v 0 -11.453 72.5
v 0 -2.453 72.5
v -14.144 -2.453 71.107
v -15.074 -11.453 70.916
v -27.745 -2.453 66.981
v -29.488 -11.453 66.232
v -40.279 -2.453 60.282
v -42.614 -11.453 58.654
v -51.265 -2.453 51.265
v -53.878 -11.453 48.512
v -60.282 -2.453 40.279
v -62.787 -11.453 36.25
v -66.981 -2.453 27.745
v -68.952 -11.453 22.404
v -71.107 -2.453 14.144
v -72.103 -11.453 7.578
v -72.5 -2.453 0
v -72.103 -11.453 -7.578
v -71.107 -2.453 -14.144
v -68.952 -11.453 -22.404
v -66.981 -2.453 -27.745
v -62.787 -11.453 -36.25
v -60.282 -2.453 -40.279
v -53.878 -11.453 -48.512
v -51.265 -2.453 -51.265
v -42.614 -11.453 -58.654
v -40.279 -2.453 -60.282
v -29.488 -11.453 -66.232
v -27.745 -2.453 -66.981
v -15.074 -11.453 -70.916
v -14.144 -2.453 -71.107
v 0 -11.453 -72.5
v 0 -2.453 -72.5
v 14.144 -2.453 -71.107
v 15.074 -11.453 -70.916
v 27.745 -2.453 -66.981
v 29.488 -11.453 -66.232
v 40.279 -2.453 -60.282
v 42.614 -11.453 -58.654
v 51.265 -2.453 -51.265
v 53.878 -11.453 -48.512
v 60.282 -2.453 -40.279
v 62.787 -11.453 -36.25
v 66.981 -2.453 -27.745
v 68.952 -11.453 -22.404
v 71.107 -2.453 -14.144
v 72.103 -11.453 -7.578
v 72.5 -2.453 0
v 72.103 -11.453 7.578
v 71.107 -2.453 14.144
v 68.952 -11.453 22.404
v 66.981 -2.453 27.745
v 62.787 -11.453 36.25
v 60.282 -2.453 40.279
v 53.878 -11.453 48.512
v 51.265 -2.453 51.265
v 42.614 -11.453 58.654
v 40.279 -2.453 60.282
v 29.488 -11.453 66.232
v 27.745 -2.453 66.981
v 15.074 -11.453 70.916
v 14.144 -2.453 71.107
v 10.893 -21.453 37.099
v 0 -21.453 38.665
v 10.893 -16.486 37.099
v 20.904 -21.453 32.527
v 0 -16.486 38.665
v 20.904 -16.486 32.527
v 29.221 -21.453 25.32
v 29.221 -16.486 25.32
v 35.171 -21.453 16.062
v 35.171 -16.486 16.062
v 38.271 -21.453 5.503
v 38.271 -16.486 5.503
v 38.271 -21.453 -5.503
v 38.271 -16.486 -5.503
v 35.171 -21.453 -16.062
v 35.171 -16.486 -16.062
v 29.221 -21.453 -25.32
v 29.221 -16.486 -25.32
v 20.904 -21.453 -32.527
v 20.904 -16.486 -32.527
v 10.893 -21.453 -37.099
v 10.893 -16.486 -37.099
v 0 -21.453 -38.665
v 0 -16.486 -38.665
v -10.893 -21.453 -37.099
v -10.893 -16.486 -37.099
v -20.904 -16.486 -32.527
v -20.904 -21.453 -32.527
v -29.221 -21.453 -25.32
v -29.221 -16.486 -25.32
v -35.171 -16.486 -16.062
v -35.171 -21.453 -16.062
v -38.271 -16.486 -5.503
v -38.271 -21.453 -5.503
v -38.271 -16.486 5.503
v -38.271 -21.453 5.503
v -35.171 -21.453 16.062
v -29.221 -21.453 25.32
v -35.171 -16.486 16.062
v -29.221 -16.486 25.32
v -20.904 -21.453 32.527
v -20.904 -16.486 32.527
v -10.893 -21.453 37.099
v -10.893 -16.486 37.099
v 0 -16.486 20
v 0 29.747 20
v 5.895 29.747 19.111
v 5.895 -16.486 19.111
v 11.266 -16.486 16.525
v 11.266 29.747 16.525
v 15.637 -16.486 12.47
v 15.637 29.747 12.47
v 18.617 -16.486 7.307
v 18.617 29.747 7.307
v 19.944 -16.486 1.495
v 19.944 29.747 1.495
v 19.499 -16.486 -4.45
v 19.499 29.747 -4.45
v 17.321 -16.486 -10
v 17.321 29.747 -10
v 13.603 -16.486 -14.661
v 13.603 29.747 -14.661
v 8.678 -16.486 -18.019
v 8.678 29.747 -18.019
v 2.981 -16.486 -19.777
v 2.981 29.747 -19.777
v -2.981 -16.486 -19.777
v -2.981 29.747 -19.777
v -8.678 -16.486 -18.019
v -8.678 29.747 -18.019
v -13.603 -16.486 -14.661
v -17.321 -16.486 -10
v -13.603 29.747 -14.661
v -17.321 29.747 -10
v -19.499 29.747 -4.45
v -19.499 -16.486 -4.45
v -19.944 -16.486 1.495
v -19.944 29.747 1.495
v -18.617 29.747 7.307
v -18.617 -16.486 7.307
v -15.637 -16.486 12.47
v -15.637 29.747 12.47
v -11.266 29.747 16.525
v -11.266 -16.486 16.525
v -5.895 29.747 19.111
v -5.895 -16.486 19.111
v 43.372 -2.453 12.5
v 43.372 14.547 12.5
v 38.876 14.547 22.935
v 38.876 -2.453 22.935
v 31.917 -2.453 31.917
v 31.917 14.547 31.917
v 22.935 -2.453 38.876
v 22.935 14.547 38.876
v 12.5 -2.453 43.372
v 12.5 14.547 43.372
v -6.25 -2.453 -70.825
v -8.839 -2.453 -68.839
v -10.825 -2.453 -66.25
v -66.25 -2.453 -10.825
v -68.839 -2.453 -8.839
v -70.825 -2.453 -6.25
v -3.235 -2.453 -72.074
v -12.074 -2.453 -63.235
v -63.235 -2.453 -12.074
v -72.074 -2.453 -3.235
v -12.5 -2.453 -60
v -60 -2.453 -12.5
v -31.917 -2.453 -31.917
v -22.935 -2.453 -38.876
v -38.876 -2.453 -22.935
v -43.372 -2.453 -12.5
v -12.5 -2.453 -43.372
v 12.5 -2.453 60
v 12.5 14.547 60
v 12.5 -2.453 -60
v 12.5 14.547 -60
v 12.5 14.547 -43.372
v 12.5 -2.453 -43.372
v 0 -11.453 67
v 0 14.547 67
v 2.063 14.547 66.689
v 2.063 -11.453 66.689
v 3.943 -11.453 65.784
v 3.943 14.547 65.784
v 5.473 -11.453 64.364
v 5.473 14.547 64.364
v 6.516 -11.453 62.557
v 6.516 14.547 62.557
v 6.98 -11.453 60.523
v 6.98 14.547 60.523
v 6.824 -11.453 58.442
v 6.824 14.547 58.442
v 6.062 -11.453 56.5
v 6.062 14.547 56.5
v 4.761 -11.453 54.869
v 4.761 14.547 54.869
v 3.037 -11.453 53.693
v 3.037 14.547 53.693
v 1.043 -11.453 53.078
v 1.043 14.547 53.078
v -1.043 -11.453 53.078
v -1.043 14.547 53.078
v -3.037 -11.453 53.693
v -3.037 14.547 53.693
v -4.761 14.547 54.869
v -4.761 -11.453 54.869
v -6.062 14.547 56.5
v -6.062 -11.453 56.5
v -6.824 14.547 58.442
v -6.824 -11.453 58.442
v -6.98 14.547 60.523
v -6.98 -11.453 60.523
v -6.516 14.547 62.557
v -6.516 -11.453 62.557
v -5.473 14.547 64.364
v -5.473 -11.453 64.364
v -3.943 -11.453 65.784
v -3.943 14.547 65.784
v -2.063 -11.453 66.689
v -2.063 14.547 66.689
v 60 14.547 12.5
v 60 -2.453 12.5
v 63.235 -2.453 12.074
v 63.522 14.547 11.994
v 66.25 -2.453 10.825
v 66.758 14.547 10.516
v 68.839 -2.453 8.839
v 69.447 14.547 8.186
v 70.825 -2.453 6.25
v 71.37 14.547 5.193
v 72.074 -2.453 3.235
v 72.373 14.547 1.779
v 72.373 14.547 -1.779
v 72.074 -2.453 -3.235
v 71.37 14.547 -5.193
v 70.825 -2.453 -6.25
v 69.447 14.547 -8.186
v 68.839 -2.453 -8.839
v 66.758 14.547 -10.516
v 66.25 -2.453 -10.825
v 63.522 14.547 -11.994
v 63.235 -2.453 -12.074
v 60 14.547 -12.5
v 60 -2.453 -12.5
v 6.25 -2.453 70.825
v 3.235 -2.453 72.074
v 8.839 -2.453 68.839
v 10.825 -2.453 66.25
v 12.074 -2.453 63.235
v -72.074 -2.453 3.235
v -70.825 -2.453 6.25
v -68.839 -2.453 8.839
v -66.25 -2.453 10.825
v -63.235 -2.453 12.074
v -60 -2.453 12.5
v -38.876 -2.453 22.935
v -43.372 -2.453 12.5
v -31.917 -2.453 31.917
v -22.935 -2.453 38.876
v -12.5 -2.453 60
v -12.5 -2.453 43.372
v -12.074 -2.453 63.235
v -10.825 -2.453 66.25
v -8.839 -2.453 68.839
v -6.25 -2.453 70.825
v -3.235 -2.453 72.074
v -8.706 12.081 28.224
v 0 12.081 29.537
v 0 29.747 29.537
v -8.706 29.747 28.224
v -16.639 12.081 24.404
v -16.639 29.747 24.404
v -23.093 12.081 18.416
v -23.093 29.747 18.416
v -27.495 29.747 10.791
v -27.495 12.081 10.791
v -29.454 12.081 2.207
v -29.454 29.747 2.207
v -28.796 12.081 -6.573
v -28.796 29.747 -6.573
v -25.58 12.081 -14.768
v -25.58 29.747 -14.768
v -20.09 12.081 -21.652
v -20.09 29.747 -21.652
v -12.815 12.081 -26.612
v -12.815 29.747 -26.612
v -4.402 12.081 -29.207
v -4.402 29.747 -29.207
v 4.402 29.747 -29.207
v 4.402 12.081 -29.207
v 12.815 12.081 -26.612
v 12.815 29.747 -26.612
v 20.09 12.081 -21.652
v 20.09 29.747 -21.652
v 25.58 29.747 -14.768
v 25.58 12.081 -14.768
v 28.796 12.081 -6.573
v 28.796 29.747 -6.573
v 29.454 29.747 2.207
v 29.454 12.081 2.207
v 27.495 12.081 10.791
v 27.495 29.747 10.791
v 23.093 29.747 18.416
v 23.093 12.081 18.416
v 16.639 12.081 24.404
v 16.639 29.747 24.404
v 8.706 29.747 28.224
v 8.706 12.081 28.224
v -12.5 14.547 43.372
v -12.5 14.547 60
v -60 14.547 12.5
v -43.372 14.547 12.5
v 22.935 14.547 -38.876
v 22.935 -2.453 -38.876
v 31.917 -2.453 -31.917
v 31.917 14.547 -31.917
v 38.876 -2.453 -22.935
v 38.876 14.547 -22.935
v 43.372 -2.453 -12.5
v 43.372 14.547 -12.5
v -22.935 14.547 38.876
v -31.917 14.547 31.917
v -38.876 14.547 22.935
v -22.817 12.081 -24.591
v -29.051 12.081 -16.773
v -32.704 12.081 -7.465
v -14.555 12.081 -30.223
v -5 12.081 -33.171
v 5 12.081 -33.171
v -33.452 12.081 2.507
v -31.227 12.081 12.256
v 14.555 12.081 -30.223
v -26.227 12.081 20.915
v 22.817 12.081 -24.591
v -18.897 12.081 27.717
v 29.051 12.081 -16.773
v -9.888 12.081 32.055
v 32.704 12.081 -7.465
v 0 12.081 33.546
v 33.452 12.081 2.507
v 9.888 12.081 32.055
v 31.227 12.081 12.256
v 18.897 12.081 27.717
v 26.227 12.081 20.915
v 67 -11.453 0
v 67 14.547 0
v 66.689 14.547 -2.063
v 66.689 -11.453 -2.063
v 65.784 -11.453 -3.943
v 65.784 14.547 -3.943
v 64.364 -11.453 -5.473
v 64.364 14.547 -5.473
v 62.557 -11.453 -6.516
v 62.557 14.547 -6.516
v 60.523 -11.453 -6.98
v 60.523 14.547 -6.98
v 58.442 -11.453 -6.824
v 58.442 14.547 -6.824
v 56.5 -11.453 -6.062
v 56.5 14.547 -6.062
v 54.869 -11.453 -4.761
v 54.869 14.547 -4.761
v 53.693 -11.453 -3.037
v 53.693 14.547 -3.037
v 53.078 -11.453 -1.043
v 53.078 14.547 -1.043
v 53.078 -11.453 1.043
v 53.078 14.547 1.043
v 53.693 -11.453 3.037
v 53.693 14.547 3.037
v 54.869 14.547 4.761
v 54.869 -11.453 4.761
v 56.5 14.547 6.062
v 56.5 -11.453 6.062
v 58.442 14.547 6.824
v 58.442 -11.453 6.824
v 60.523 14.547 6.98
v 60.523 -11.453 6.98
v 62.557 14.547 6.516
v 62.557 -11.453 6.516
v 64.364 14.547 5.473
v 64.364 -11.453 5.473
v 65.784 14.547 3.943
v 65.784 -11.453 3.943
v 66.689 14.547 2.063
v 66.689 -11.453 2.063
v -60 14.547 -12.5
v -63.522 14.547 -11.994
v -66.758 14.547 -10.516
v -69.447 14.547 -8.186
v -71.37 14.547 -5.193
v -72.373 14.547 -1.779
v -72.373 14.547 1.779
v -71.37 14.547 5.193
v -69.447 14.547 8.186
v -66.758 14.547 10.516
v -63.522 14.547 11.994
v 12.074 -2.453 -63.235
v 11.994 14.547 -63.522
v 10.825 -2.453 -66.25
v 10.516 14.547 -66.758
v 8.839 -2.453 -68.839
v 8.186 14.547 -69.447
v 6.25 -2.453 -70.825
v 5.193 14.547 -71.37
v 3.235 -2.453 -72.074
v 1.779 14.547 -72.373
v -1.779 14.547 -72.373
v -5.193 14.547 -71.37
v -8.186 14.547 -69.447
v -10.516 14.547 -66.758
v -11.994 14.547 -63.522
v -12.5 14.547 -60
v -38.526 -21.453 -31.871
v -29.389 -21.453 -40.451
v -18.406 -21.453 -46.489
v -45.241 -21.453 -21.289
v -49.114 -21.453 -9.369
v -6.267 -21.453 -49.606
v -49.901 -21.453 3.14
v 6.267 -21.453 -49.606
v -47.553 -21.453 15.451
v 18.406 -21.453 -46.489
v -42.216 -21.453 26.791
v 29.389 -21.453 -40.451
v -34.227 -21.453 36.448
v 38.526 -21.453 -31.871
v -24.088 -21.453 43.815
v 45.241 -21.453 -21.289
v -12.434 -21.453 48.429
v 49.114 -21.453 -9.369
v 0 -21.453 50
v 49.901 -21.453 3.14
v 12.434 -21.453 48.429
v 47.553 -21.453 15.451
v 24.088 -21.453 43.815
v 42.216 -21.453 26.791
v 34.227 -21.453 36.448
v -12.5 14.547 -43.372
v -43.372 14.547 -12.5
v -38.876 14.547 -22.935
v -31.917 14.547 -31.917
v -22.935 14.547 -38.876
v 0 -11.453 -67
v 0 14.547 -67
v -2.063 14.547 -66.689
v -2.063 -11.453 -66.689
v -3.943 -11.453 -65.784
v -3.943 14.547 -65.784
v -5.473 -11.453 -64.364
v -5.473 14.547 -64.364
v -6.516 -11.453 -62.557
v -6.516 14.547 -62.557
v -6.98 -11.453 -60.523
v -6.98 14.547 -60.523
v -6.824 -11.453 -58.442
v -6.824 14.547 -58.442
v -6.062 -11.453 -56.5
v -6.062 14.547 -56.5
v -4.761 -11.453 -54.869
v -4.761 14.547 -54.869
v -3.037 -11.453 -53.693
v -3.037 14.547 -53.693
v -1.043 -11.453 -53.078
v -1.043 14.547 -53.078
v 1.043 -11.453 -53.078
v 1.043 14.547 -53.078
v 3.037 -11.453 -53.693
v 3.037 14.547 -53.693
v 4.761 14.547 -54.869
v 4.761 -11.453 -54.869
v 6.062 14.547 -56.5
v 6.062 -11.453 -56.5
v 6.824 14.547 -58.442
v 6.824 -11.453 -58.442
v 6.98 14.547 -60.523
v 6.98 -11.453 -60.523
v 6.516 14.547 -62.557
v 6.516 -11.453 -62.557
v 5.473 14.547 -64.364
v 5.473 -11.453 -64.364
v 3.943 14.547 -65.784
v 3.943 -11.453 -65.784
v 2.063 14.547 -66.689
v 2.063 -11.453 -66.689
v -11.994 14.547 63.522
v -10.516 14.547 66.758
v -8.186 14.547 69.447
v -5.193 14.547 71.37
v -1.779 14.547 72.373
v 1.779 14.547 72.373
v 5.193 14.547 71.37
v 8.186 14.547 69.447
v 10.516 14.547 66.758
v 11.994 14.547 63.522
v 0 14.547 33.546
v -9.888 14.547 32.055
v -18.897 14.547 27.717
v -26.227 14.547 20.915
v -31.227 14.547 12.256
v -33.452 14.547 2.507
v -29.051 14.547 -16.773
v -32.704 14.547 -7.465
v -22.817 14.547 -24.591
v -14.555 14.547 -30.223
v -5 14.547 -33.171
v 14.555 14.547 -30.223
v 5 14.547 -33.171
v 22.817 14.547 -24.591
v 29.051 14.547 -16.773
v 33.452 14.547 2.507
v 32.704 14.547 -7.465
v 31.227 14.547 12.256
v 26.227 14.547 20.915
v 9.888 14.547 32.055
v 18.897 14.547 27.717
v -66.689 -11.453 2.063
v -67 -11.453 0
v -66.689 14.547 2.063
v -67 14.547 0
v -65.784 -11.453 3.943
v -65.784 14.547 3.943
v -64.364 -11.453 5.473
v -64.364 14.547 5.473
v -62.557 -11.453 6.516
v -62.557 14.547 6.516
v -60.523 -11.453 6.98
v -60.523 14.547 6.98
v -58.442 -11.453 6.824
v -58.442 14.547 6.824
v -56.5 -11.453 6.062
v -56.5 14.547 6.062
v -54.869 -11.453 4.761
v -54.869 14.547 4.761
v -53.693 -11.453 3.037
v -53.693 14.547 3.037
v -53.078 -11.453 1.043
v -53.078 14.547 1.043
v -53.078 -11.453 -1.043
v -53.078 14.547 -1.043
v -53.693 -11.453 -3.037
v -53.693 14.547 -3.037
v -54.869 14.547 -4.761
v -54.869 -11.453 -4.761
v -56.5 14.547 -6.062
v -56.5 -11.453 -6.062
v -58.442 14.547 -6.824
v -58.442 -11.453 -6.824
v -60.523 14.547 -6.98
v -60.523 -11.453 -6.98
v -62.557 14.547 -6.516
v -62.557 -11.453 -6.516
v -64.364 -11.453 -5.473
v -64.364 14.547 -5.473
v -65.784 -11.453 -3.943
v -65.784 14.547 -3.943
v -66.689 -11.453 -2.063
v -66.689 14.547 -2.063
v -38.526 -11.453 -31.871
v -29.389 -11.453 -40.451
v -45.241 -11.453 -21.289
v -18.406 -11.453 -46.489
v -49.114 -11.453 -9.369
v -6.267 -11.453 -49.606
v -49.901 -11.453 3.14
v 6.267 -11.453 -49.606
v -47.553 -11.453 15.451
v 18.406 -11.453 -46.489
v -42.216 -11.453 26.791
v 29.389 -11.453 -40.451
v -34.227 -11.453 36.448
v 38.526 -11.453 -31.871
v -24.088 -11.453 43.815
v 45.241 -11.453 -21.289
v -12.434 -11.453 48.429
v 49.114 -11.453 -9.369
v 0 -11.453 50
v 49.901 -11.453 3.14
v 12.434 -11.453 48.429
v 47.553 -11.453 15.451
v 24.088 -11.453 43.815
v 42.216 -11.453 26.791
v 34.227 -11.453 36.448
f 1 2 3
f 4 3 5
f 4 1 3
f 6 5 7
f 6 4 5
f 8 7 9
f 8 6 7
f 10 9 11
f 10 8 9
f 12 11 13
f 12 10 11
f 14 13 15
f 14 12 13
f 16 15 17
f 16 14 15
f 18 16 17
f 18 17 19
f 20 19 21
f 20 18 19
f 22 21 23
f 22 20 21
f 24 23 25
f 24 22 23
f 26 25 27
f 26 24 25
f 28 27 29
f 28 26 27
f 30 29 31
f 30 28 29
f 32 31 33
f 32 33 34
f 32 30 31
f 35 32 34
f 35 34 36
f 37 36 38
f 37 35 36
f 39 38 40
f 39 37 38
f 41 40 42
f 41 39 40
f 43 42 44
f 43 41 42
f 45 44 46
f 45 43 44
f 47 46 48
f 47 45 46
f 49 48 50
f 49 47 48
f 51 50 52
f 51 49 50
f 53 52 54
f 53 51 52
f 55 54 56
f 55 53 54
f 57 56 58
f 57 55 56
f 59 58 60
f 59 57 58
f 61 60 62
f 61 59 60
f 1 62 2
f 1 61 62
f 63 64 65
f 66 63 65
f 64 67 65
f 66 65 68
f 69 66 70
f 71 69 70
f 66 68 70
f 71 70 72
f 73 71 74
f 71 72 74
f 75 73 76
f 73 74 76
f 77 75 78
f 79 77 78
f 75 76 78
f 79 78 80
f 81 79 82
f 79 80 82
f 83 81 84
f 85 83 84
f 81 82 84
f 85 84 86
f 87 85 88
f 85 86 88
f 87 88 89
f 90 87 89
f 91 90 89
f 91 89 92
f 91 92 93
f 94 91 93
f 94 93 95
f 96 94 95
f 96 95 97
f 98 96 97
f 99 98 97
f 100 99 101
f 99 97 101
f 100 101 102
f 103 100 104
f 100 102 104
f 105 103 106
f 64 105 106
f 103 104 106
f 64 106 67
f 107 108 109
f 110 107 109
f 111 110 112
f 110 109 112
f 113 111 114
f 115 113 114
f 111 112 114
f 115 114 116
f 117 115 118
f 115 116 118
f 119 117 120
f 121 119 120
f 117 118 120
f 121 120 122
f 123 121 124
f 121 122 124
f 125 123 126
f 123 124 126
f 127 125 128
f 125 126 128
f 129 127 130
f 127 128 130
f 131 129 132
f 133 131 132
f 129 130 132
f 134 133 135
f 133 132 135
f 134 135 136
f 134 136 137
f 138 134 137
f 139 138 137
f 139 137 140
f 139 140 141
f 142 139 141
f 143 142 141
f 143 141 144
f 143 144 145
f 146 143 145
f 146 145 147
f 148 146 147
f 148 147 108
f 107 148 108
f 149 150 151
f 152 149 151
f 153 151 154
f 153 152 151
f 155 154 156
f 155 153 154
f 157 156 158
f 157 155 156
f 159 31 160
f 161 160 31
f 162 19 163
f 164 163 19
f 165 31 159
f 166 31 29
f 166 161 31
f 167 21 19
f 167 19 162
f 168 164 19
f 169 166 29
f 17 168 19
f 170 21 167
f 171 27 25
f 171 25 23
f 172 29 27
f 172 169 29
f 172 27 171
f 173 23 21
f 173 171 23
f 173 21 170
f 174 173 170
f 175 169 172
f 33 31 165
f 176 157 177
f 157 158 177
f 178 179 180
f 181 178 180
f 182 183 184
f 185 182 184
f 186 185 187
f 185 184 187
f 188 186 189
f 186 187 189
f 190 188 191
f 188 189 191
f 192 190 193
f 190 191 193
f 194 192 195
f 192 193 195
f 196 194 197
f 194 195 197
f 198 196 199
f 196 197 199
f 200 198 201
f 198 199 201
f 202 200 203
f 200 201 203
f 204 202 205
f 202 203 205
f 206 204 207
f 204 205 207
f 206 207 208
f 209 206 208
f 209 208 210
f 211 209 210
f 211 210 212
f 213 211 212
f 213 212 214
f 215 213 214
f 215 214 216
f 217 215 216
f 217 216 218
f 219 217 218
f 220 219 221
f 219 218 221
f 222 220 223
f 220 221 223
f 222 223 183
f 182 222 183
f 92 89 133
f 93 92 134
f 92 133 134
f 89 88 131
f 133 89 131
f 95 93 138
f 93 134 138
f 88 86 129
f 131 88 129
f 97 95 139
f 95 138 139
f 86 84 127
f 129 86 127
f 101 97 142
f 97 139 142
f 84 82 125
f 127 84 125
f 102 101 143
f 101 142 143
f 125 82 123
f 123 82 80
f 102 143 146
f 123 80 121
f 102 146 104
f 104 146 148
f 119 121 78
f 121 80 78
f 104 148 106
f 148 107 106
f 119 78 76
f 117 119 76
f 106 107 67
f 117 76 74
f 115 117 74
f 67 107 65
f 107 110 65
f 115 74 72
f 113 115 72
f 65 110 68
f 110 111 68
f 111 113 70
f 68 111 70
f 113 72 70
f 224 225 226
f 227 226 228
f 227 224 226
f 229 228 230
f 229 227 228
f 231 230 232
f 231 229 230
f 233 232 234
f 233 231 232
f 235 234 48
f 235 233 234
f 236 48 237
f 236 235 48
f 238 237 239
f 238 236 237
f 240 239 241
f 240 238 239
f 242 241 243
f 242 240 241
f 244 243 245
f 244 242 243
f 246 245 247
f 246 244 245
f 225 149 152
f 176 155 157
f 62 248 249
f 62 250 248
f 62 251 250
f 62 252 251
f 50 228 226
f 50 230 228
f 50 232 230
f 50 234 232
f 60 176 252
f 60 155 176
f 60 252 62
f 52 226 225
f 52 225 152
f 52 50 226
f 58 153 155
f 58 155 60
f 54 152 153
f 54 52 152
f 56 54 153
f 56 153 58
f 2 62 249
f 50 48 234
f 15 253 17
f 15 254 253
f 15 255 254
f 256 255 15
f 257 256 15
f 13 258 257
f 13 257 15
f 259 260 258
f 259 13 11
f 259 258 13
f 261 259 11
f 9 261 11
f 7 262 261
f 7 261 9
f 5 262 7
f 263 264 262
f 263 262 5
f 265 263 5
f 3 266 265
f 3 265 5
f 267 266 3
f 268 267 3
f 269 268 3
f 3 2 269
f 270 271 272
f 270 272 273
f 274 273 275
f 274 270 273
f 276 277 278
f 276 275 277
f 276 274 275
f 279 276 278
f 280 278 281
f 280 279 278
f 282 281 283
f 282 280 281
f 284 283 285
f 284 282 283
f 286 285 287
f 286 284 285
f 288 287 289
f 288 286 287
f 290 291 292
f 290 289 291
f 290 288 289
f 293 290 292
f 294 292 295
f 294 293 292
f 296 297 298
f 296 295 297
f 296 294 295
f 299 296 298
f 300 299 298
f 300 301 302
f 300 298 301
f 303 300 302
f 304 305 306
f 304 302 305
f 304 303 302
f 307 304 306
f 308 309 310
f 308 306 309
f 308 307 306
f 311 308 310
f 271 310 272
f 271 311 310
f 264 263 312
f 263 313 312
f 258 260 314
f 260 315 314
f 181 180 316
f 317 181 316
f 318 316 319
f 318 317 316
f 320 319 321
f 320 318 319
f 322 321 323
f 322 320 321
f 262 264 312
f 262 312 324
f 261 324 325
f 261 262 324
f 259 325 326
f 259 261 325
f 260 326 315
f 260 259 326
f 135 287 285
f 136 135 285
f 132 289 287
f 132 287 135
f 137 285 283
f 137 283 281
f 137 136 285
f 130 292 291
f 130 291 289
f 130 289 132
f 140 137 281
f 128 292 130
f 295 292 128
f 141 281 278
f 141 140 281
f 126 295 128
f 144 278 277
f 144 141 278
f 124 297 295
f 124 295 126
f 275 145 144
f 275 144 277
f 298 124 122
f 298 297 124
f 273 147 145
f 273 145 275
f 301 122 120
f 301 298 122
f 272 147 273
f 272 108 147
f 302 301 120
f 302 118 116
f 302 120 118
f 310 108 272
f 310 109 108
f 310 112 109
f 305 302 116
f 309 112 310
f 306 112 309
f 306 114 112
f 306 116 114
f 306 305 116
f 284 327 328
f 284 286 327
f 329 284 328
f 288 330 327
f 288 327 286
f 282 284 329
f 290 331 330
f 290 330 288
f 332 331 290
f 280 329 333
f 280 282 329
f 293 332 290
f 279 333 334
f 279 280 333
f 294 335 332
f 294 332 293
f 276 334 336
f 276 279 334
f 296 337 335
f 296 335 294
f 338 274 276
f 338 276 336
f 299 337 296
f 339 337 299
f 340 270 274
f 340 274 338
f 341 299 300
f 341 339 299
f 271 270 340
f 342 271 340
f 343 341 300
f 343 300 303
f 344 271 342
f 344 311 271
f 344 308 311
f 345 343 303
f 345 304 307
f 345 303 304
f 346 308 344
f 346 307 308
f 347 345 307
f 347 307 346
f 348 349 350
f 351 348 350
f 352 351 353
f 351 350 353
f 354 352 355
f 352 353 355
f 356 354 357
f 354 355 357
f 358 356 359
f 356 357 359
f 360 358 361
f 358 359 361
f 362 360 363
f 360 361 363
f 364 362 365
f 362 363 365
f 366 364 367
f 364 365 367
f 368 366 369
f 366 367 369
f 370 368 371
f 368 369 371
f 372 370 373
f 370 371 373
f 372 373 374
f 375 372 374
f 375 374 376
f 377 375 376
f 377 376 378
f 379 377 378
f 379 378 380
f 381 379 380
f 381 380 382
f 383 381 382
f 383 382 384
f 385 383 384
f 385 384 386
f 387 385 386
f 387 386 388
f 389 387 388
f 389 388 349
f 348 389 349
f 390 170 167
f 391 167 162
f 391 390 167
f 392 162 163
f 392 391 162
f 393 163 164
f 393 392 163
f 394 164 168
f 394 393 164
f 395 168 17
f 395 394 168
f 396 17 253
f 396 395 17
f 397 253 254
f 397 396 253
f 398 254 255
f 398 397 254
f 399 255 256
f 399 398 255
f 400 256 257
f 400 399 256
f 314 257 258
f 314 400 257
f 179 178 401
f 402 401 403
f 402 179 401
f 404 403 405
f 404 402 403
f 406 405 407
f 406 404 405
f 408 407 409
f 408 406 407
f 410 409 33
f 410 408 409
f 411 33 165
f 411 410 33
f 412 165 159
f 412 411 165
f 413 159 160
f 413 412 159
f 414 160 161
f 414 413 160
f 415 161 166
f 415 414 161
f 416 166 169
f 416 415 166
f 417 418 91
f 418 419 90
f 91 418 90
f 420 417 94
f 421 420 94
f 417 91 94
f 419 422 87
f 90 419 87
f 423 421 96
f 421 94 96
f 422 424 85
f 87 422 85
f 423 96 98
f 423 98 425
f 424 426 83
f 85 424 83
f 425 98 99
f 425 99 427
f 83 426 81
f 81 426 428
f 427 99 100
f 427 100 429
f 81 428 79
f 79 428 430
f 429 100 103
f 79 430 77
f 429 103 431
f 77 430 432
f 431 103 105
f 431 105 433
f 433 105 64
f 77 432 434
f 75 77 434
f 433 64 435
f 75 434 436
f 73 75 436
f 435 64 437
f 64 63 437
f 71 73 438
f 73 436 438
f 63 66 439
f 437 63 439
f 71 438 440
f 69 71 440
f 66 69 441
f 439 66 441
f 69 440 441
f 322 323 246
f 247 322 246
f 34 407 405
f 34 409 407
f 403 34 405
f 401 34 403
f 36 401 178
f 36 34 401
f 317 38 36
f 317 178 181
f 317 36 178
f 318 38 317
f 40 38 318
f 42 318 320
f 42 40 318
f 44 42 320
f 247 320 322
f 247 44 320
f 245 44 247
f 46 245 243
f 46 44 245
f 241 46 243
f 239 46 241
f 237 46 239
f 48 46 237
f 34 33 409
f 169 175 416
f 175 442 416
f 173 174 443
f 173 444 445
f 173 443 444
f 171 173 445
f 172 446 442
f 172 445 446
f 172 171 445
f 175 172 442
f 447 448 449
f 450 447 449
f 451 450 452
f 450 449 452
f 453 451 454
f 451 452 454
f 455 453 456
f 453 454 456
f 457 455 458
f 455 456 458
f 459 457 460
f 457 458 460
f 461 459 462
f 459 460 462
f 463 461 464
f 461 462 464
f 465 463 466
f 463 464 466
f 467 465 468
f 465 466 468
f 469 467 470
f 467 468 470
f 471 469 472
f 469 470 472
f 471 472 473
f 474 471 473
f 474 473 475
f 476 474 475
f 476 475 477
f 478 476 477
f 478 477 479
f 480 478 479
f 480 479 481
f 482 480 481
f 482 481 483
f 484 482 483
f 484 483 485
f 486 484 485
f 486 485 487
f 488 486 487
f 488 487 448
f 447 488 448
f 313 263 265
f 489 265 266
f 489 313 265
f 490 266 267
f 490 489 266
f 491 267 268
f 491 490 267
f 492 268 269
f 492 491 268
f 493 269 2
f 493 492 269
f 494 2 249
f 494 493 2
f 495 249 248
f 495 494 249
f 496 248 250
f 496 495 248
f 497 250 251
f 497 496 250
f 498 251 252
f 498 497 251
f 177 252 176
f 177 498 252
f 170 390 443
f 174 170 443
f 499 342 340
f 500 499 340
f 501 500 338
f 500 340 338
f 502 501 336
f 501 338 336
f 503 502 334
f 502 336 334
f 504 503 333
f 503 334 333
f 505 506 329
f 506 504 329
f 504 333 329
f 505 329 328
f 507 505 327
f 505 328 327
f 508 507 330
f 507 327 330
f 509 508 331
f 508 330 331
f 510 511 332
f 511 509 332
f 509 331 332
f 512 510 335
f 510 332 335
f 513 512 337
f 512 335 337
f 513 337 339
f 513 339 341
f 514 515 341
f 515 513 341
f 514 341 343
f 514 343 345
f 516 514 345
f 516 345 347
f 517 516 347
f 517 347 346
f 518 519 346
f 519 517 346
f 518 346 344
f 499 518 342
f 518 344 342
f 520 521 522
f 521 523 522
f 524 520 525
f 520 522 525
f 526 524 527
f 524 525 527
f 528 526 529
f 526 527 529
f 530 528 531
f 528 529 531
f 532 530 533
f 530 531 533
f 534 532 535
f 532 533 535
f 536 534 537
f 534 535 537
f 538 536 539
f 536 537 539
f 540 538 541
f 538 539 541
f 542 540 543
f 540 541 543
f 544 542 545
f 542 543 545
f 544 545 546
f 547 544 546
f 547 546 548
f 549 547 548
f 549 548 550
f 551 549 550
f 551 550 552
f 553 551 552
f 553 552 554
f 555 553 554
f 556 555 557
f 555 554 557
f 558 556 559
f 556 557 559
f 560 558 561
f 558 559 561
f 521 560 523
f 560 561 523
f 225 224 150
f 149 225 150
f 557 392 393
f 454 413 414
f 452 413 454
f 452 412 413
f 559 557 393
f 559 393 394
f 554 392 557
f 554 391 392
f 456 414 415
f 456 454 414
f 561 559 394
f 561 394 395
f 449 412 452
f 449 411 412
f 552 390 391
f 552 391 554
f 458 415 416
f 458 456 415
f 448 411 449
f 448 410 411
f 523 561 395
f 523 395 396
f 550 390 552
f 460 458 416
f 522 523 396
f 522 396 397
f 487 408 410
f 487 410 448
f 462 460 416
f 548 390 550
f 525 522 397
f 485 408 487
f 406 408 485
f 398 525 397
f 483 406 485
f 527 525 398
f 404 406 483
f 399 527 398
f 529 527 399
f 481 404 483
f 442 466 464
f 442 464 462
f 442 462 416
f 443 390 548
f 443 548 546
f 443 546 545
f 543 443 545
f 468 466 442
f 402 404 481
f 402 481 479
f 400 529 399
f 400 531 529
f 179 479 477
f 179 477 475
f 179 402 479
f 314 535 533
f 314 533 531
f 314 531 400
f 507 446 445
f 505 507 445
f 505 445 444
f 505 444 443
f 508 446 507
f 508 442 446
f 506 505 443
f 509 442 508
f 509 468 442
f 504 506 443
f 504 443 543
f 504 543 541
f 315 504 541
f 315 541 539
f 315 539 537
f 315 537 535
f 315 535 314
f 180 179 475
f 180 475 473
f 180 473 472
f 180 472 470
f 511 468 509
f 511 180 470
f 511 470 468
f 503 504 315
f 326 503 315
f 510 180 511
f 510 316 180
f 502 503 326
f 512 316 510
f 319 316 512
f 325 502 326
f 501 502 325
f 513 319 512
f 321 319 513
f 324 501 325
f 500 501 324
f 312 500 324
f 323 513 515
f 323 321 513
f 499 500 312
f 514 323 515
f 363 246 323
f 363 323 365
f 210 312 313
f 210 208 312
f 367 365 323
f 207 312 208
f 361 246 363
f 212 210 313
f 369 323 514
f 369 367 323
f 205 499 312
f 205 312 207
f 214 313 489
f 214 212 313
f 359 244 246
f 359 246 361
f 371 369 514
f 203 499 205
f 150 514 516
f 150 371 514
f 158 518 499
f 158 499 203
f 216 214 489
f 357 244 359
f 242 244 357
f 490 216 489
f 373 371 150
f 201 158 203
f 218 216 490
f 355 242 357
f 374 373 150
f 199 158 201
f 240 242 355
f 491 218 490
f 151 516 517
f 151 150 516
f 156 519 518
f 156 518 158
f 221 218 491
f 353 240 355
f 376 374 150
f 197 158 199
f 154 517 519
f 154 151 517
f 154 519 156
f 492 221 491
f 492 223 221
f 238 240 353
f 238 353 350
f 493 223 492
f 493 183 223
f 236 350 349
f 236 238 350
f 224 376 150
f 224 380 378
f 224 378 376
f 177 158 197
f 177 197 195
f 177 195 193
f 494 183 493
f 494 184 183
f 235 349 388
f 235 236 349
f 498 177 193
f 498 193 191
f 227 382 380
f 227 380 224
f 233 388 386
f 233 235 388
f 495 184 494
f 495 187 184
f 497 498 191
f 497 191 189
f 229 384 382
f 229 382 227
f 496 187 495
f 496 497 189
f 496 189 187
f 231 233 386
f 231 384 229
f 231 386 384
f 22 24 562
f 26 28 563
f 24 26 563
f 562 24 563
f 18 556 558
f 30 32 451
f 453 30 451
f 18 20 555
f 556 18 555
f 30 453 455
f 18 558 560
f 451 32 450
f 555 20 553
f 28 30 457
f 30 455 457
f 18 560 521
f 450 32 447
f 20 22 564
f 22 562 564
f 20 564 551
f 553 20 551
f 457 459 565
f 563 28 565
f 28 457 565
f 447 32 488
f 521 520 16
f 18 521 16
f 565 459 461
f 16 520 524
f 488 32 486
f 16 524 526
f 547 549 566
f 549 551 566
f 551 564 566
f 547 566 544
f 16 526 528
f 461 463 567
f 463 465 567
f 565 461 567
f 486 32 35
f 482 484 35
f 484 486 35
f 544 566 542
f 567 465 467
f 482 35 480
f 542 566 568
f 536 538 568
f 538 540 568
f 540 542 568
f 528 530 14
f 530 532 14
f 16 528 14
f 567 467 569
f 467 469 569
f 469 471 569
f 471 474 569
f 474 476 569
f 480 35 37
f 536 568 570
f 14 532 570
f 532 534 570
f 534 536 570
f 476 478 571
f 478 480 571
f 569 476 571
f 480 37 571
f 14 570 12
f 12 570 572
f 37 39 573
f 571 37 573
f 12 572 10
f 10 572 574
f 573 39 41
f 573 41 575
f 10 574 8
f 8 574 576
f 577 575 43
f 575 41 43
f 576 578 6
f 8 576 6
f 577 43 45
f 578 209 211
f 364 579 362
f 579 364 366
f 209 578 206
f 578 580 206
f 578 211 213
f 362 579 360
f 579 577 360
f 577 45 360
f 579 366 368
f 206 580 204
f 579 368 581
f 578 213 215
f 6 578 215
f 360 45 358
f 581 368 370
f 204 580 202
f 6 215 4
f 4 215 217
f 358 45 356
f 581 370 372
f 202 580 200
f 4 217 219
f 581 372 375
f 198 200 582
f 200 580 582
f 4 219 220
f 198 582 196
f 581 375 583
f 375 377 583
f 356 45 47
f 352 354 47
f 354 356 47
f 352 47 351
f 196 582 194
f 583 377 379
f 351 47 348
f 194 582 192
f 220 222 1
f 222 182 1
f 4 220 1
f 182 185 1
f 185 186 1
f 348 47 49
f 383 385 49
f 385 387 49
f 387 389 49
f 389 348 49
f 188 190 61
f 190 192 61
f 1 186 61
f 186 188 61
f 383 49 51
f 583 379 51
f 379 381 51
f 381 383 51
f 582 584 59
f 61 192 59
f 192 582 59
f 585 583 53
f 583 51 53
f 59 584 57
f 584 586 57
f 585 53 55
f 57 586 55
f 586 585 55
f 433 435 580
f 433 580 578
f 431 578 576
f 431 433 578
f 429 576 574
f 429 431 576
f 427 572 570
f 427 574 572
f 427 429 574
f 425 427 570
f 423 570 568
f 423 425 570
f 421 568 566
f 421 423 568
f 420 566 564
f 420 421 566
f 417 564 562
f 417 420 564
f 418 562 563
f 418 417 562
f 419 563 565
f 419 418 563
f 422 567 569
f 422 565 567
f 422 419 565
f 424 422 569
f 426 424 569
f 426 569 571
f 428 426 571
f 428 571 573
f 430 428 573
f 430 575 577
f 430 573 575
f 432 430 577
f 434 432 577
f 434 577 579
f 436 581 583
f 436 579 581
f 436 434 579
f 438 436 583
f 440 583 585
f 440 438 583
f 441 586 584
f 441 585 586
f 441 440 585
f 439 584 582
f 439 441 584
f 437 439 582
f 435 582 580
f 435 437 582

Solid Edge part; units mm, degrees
sketch "Sketch1" plane through (0, 0, 0) normal (1, 0, 0) x (0, 1, 0)
  line L0 (-16.4856, 20) -> (29.747, 20)
  line L1 (29.747, 20) -> (29.747, 29.5367)
  line L2 (29.747, 29.5367) -> (12.0813, 29.5367)
  line L3 (12.0813, 33.5455) -> (12.0813, 29.5367)
  line L4 (14.547, 33.5455) -> (12.0813, 33.5455)
  line L5 (14.547, 33.5455) -> (14.547, 45.137)
  line L6 (14.547, 45.137) -> (-2.453, 45.137)
  line L7 (-2.453, 45.137) -> (-2.453, 72.5)
  line L8 (-2.453, 72.5) -> (-11.453, 72.5)
  line L9 (-11.453, 72.5) -> (-11.453, 50)
  line L10 (-11.453, 50) -> (-21.453, 50)
  line L11 (-21.453, 50) -> (-21.453, 38.6647)
  line L12 (-21.453, 38.6647) -> (-16.4856, 38.6647)
  line L13 (-16.4856, 38.6647) -> (-16.4856, 20)
  dimension "D1" = 10
  dimension "D2" = 9
  dimension "D3" = 26
  dimension "D4" = 41.2
revolve "RevolvedProtrusion1" add sketch "Sketch1" angle 360 about axis through (0, -60, 0) along (0, 1, 0)
sketch "Sketch2" plane through (0, 14.547, 0) normal (0, 1, 0) x (-1, 0, 0)
  line L0 (-12.5, 43.3717) -> (-12.5, 60)
  arc A0 (-12.5, 60) -> (12.5, 60) centre (0, 60) cw
  line L1 (12.5, 60) -> (12.5, 43.3717)
  arc A1 (-12.5, 43.3717) -> (12.5, 43.3717) centre (0, 0) cw
extrude "Protrusion1" add sketch "Sketch2" against normal up to next
hole "Hole1" at (0, 14.547, 60) direction (0, -1, 0) diameter 14 end up to next
pattern_circular "Pattern1" count 4 over 360 about axis through (0, 0, 0) along (0, 1, 0) of "Protrusion1"
pattern_circular "Pattern2" count 4 over 360 about axis through (0, 14.547, 0) along (0, -1, 0) of "Hole1"
